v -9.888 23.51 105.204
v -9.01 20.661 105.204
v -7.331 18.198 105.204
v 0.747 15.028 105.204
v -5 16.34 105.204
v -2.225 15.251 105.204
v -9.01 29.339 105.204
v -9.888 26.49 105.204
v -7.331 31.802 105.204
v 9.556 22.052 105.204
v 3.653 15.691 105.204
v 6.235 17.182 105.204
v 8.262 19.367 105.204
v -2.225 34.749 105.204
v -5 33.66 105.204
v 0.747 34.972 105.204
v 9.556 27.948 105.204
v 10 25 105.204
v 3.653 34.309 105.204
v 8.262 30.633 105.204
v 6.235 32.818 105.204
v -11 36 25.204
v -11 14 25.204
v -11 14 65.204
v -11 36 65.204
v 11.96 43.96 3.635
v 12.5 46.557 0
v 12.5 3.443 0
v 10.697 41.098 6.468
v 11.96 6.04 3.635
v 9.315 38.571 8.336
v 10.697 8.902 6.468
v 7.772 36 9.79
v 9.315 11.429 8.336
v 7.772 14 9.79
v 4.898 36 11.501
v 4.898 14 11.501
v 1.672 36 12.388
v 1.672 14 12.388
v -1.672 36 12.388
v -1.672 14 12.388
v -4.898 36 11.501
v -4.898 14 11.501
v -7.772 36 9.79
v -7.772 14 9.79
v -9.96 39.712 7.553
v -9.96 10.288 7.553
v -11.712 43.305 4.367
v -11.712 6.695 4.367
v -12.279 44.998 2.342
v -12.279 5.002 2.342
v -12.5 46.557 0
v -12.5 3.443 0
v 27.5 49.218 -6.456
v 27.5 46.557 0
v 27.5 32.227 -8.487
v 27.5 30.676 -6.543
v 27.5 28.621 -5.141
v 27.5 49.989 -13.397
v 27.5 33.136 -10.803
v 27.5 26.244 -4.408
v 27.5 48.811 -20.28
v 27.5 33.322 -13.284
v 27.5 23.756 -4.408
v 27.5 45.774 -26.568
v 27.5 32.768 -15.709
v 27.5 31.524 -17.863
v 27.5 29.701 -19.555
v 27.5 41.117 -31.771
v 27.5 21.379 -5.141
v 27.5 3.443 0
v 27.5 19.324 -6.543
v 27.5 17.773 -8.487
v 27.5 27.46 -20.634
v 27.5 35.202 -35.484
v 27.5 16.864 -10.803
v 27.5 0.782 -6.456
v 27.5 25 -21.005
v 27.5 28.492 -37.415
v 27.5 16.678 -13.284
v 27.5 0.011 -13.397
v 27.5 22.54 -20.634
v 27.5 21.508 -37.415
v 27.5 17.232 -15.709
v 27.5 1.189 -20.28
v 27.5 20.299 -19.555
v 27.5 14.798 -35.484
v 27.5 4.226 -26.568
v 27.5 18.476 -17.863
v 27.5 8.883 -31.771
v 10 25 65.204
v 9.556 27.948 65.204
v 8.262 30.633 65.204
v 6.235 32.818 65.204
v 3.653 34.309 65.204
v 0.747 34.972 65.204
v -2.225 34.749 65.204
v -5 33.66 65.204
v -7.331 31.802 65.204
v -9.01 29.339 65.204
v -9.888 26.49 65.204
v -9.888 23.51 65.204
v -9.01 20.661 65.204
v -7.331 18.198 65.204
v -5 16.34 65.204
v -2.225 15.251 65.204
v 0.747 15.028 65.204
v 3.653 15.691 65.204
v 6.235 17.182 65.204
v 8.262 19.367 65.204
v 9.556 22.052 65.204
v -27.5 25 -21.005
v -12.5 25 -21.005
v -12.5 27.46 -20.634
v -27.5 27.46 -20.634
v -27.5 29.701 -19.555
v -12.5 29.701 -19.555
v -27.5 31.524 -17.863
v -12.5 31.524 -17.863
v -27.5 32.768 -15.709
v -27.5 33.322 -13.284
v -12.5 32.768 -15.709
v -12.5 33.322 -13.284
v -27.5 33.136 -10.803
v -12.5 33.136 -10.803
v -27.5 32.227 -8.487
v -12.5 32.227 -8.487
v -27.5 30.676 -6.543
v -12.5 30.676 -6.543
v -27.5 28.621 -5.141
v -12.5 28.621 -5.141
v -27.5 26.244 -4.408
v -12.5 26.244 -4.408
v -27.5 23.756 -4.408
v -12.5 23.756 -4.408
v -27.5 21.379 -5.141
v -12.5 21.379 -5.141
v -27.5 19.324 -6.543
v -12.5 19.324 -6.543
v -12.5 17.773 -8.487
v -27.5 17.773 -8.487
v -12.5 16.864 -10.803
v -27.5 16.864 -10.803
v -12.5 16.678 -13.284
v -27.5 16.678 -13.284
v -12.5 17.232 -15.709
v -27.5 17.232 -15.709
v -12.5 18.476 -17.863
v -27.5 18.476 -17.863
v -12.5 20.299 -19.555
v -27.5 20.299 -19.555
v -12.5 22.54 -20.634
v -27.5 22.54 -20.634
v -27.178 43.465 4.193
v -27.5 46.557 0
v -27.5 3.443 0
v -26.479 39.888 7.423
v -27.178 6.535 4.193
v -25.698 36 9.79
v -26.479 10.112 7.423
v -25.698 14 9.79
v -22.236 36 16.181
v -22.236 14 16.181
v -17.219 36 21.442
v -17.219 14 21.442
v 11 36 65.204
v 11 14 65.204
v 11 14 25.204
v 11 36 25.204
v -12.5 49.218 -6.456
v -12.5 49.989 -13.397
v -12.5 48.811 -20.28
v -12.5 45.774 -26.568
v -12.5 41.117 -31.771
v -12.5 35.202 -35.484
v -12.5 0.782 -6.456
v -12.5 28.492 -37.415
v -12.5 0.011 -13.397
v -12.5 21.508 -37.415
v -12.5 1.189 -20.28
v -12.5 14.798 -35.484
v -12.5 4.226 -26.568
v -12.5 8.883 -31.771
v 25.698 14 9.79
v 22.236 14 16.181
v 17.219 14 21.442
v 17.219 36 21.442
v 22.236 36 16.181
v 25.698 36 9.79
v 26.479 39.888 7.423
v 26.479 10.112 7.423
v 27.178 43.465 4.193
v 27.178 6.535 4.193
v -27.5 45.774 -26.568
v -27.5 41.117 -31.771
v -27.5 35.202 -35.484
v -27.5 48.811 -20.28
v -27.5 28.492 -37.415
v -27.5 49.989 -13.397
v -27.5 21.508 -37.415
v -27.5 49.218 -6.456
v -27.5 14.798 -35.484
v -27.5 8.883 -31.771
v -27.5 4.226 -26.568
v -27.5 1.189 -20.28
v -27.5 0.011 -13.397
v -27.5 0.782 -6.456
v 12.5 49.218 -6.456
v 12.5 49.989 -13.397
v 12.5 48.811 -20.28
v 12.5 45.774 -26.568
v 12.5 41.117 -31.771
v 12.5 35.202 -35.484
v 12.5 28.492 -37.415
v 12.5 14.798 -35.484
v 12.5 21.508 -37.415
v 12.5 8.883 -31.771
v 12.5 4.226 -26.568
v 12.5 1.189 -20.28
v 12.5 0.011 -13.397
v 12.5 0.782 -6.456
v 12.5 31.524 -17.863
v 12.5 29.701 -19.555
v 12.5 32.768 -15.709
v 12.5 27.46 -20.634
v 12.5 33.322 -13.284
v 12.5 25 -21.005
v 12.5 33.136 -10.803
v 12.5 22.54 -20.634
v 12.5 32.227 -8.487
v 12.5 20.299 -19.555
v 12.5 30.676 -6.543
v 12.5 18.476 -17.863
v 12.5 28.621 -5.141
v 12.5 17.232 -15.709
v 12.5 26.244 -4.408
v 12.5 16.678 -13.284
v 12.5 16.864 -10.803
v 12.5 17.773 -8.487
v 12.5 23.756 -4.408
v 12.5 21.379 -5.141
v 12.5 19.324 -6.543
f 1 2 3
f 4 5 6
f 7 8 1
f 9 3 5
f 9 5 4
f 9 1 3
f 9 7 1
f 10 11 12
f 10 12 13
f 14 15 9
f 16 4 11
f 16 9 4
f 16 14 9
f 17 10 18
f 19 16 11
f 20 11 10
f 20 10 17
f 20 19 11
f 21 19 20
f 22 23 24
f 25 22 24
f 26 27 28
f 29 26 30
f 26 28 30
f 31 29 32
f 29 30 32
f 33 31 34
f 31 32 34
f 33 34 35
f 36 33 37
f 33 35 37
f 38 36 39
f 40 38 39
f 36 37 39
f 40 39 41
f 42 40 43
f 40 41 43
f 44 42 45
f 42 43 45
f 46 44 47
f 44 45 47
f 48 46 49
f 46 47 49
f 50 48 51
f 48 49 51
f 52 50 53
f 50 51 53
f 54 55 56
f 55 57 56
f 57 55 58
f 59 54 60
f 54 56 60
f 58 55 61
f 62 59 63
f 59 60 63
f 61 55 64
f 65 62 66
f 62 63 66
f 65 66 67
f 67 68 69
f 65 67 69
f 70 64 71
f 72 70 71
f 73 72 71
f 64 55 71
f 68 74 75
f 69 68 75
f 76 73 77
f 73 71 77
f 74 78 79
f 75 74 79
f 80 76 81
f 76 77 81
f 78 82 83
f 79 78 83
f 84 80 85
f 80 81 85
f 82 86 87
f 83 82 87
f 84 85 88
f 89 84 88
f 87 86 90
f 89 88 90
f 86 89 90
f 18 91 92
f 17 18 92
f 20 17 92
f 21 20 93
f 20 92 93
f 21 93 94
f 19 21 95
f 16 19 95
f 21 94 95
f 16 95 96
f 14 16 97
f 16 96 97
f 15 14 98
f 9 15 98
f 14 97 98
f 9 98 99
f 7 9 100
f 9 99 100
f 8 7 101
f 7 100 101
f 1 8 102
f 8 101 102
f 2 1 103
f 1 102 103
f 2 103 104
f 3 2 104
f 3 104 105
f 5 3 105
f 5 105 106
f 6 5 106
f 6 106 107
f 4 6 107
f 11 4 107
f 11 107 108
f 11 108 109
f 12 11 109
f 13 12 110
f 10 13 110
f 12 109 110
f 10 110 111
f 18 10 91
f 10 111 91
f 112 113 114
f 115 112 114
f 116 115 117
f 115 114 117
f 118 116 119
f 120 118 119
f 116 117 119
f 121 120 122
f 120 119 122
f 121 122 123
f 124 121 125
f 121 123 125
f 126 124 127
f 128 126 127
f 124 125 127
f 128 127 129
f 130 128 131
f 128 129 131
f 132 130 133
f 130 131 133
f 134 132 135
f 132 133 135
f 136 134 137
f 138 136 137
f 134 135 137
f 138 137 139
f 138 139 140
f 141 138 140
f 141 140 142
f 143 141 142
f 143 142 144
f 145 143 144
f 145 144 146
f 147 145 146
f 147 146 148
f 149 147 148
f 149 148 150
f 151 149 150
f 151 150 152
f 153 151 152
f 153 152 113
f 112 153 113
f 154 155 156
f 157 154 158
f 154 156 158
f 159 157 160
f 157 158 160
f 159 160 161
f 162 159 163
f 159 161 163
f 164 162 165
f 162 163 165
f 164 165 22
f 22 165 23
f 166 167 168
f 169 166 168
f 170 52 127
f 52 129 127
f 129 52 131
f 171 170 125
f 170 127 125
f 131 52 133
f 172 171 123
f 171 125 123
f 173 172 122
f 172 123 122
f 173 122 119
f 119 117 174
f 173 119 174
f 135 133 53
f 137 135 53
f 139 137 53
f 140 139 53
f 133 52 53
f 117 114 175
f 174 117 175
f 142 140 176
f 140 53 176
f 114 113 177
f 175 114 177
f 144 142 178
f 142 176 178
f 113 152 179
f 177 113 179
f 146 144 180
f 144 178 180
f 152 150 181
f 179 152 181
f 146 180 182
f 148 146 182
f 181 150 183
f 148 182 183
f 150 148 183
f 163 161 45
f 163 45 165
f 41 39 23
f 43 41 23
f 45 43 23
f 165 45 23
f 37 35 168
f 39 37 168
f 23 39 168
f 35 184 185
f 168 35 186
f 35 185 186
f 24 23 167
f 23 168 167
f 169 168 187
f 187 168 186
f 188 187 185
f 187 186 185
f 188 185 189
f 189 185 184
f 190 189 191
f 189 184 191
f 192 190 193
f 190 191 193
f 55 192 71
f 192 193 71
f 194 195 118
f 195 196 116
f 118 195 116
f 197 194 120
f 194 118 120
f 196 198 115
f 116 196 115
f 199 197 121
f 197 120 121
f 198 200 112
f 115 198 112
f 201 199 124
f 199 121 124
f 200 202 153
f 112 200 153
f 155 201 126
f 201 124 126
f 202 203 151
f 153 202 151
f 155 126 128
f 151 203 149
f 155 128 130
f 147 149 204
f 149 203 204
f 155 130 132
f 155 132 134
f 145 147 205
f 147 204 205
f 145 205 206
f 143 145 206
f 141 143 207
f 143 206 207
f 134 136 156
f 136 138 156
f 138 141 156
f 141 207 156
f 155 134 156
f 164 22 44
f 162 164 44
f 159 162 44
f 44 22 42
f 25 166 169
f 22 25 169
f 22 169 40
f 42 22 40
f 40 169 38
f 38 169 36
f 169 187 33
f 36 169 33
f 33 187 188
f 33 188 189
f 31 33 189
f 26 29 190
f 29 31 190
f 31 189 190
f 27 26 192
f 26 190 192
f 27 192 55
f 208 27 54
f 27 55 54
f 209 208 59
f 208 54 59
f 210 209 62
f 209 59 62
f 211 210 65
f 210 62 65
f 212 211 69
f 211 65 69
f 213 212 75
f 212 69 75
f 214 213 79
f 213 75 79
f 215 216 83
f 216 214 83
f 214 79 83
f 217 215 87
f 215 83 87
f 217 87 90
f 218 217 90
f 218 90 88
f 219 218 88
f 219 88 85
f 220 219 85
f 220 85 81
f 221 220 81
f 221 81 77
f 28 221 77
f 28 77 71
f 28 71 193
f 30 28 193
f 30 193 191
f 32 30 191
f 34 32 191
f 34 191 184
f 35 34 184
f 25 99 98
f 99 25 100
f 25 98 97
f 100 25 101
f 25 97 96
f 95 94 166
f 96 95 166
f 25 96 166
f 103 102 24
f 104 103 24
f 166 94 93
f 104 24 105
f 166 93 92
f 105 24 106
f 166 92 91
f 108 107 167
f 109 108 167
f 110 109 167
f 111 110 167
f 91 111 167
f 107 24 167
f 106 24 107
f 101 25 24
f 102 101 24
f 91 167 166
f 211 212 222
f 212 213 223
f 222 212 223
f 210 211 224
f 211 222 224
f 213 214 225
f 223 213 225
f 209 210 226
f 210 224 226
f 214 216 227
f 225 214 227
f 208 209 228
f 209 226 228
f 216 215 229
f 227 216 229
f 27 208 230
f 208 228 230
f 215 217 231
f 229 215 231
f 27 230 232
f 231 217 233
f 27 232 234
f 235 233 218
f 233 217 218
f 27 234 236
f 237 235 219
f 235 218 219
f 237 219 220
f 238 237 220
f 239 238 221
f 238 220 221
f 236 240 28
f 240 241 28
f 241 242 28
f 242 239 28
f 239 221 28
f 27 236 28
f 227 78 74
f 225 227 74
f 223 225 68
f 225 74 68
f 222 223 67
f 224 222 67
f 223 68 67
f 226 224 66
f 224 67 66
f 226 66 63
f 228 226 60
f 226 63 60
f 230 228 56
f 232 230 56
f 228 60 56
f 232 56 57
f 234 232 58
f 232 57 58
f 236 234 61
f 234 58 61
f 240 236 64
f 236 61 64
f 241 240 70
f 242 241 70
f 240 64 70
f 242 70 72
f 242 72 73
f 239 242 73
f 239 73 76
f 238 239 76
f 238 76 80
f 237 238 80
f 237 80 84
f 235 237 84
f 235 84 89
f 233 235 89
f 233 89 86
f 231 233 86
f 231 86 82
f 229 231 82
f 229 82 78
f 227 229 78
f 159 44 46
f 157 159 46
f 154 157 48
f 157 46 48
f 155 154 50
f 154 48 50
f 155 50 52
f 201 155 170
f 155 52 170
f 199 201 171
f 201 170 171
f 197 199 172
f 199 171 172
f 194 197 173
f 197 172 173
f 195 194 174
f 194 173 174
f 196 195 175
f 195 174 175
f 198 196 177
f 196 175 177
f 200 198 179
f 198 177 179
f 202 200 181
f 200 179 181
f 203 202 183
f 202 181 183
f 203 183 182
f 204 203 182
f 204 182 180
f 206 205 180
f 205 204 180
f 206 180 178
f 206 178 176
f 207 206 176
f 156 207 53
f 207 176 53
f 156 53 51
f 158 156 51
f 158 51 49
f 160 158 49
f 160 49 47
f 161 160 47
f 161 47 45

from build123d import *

# Parameters (mm, degrees)
BOSS_EXTRUDE1_DEPTH = 50
SKETCH4_OUTSIDE_W   = 144.624
SKETCH4_OUTSIDE_H   = 79.42
SKETCH4_OUTSIDE_R   = 8.345
CUT_EXTRUDE1_DEPTH  = 99.876606464
SKETCH5_R           = 10
BOSS_EXTRUDE2_DEPTH = 40


with BuildPart() as part:
    # Sketch3 → Boss-Extrude1 (new body)
    with BuildSketch(Plane(origin=(0, 0, 0), x_dir=(1, 0, 0), z_dir=(0, 1, 0))):
        with BuildLine():
            Line((-12.5, 0), (-12.5, 50))
            Line((-12.5, 50), (-27.5, 50))
            Line((-27.5, 50), (-27.5, 0))
            ThreePointArc((-27.5, 0), (-23.00815073, -15.062370331), (-11, -25.204166322))
            Line((-11, -25.204166322), (-11, -65.204166322))
            Line((-11, -65.204166322), (11, -65.204166322))
            Line((11, -65.204166322), (11, -25.204166322))
            ThreePointArc((11, -25.204166322), (23.00815073, -15.062370331), (27.5, 0))
            Line((27.5, 0), (27.5, 37.66))
            Line((27.5, 37.66), (12.5, 37.66))
            Line((12.5, 37.66), (12.5, 0))
            ThreePointArc((12.5, 0), (0, -12.5), (-12.5, 0))
        make_face()
    extrude(amount=BOSS_EXTRUDE1_DEPTH)

    # Sketch4 outside → Cut-Extrude1 (cut, through all)
    # profile 1 of 2: a face of its own
    with BuildSketch(Plane(origin=(27.5, 0, 0), x_dir=(0, 0, -1), z_dir=(1, 0, 0))):
        with Locations((-7.602, 25)):
            Rectangle(SKETCH4_OUTSIDE_W, SKETCH4_OUTSIDE_H)
        with BuildLine():
            Line((-9.789944321, 14), (-65.204166322, 14))
            Line((-65.204166322, 14), (-65.204166322, 36))
            Line((-65.204166322, 36), (-9.789944321, 36))
            ThreePointArc((-9.789944321, 36), (37.66, 25), (-9.789944321, 14))
        make_face(mode=Mode.SUBTRACT)
    # profile 2 of 2: a face of its own
    with BuildSketch(Plane(origin=(27.5, 0, 0), x_dir=(0, 0, -1), z_dir=(1, 0, 0))):
        with Locations((12.66, 25)):
            Circle(SKETCH4_OUTSIDE_R)
    extrude(amount=-CUT_EXTRUDE1_DEPTH, mode=Mode.SUBTRACT)

    # Sketch5 → Boss-Extrude2 (add)
    with BuildSketch(Plane.XY.offset(65.204166322)):
        with Locations((0, 25)):
            Circle(SKETCH5_R)
    extrude(amount=BOSS_EXTRUDE2_DEPTH)


solid = part.part
